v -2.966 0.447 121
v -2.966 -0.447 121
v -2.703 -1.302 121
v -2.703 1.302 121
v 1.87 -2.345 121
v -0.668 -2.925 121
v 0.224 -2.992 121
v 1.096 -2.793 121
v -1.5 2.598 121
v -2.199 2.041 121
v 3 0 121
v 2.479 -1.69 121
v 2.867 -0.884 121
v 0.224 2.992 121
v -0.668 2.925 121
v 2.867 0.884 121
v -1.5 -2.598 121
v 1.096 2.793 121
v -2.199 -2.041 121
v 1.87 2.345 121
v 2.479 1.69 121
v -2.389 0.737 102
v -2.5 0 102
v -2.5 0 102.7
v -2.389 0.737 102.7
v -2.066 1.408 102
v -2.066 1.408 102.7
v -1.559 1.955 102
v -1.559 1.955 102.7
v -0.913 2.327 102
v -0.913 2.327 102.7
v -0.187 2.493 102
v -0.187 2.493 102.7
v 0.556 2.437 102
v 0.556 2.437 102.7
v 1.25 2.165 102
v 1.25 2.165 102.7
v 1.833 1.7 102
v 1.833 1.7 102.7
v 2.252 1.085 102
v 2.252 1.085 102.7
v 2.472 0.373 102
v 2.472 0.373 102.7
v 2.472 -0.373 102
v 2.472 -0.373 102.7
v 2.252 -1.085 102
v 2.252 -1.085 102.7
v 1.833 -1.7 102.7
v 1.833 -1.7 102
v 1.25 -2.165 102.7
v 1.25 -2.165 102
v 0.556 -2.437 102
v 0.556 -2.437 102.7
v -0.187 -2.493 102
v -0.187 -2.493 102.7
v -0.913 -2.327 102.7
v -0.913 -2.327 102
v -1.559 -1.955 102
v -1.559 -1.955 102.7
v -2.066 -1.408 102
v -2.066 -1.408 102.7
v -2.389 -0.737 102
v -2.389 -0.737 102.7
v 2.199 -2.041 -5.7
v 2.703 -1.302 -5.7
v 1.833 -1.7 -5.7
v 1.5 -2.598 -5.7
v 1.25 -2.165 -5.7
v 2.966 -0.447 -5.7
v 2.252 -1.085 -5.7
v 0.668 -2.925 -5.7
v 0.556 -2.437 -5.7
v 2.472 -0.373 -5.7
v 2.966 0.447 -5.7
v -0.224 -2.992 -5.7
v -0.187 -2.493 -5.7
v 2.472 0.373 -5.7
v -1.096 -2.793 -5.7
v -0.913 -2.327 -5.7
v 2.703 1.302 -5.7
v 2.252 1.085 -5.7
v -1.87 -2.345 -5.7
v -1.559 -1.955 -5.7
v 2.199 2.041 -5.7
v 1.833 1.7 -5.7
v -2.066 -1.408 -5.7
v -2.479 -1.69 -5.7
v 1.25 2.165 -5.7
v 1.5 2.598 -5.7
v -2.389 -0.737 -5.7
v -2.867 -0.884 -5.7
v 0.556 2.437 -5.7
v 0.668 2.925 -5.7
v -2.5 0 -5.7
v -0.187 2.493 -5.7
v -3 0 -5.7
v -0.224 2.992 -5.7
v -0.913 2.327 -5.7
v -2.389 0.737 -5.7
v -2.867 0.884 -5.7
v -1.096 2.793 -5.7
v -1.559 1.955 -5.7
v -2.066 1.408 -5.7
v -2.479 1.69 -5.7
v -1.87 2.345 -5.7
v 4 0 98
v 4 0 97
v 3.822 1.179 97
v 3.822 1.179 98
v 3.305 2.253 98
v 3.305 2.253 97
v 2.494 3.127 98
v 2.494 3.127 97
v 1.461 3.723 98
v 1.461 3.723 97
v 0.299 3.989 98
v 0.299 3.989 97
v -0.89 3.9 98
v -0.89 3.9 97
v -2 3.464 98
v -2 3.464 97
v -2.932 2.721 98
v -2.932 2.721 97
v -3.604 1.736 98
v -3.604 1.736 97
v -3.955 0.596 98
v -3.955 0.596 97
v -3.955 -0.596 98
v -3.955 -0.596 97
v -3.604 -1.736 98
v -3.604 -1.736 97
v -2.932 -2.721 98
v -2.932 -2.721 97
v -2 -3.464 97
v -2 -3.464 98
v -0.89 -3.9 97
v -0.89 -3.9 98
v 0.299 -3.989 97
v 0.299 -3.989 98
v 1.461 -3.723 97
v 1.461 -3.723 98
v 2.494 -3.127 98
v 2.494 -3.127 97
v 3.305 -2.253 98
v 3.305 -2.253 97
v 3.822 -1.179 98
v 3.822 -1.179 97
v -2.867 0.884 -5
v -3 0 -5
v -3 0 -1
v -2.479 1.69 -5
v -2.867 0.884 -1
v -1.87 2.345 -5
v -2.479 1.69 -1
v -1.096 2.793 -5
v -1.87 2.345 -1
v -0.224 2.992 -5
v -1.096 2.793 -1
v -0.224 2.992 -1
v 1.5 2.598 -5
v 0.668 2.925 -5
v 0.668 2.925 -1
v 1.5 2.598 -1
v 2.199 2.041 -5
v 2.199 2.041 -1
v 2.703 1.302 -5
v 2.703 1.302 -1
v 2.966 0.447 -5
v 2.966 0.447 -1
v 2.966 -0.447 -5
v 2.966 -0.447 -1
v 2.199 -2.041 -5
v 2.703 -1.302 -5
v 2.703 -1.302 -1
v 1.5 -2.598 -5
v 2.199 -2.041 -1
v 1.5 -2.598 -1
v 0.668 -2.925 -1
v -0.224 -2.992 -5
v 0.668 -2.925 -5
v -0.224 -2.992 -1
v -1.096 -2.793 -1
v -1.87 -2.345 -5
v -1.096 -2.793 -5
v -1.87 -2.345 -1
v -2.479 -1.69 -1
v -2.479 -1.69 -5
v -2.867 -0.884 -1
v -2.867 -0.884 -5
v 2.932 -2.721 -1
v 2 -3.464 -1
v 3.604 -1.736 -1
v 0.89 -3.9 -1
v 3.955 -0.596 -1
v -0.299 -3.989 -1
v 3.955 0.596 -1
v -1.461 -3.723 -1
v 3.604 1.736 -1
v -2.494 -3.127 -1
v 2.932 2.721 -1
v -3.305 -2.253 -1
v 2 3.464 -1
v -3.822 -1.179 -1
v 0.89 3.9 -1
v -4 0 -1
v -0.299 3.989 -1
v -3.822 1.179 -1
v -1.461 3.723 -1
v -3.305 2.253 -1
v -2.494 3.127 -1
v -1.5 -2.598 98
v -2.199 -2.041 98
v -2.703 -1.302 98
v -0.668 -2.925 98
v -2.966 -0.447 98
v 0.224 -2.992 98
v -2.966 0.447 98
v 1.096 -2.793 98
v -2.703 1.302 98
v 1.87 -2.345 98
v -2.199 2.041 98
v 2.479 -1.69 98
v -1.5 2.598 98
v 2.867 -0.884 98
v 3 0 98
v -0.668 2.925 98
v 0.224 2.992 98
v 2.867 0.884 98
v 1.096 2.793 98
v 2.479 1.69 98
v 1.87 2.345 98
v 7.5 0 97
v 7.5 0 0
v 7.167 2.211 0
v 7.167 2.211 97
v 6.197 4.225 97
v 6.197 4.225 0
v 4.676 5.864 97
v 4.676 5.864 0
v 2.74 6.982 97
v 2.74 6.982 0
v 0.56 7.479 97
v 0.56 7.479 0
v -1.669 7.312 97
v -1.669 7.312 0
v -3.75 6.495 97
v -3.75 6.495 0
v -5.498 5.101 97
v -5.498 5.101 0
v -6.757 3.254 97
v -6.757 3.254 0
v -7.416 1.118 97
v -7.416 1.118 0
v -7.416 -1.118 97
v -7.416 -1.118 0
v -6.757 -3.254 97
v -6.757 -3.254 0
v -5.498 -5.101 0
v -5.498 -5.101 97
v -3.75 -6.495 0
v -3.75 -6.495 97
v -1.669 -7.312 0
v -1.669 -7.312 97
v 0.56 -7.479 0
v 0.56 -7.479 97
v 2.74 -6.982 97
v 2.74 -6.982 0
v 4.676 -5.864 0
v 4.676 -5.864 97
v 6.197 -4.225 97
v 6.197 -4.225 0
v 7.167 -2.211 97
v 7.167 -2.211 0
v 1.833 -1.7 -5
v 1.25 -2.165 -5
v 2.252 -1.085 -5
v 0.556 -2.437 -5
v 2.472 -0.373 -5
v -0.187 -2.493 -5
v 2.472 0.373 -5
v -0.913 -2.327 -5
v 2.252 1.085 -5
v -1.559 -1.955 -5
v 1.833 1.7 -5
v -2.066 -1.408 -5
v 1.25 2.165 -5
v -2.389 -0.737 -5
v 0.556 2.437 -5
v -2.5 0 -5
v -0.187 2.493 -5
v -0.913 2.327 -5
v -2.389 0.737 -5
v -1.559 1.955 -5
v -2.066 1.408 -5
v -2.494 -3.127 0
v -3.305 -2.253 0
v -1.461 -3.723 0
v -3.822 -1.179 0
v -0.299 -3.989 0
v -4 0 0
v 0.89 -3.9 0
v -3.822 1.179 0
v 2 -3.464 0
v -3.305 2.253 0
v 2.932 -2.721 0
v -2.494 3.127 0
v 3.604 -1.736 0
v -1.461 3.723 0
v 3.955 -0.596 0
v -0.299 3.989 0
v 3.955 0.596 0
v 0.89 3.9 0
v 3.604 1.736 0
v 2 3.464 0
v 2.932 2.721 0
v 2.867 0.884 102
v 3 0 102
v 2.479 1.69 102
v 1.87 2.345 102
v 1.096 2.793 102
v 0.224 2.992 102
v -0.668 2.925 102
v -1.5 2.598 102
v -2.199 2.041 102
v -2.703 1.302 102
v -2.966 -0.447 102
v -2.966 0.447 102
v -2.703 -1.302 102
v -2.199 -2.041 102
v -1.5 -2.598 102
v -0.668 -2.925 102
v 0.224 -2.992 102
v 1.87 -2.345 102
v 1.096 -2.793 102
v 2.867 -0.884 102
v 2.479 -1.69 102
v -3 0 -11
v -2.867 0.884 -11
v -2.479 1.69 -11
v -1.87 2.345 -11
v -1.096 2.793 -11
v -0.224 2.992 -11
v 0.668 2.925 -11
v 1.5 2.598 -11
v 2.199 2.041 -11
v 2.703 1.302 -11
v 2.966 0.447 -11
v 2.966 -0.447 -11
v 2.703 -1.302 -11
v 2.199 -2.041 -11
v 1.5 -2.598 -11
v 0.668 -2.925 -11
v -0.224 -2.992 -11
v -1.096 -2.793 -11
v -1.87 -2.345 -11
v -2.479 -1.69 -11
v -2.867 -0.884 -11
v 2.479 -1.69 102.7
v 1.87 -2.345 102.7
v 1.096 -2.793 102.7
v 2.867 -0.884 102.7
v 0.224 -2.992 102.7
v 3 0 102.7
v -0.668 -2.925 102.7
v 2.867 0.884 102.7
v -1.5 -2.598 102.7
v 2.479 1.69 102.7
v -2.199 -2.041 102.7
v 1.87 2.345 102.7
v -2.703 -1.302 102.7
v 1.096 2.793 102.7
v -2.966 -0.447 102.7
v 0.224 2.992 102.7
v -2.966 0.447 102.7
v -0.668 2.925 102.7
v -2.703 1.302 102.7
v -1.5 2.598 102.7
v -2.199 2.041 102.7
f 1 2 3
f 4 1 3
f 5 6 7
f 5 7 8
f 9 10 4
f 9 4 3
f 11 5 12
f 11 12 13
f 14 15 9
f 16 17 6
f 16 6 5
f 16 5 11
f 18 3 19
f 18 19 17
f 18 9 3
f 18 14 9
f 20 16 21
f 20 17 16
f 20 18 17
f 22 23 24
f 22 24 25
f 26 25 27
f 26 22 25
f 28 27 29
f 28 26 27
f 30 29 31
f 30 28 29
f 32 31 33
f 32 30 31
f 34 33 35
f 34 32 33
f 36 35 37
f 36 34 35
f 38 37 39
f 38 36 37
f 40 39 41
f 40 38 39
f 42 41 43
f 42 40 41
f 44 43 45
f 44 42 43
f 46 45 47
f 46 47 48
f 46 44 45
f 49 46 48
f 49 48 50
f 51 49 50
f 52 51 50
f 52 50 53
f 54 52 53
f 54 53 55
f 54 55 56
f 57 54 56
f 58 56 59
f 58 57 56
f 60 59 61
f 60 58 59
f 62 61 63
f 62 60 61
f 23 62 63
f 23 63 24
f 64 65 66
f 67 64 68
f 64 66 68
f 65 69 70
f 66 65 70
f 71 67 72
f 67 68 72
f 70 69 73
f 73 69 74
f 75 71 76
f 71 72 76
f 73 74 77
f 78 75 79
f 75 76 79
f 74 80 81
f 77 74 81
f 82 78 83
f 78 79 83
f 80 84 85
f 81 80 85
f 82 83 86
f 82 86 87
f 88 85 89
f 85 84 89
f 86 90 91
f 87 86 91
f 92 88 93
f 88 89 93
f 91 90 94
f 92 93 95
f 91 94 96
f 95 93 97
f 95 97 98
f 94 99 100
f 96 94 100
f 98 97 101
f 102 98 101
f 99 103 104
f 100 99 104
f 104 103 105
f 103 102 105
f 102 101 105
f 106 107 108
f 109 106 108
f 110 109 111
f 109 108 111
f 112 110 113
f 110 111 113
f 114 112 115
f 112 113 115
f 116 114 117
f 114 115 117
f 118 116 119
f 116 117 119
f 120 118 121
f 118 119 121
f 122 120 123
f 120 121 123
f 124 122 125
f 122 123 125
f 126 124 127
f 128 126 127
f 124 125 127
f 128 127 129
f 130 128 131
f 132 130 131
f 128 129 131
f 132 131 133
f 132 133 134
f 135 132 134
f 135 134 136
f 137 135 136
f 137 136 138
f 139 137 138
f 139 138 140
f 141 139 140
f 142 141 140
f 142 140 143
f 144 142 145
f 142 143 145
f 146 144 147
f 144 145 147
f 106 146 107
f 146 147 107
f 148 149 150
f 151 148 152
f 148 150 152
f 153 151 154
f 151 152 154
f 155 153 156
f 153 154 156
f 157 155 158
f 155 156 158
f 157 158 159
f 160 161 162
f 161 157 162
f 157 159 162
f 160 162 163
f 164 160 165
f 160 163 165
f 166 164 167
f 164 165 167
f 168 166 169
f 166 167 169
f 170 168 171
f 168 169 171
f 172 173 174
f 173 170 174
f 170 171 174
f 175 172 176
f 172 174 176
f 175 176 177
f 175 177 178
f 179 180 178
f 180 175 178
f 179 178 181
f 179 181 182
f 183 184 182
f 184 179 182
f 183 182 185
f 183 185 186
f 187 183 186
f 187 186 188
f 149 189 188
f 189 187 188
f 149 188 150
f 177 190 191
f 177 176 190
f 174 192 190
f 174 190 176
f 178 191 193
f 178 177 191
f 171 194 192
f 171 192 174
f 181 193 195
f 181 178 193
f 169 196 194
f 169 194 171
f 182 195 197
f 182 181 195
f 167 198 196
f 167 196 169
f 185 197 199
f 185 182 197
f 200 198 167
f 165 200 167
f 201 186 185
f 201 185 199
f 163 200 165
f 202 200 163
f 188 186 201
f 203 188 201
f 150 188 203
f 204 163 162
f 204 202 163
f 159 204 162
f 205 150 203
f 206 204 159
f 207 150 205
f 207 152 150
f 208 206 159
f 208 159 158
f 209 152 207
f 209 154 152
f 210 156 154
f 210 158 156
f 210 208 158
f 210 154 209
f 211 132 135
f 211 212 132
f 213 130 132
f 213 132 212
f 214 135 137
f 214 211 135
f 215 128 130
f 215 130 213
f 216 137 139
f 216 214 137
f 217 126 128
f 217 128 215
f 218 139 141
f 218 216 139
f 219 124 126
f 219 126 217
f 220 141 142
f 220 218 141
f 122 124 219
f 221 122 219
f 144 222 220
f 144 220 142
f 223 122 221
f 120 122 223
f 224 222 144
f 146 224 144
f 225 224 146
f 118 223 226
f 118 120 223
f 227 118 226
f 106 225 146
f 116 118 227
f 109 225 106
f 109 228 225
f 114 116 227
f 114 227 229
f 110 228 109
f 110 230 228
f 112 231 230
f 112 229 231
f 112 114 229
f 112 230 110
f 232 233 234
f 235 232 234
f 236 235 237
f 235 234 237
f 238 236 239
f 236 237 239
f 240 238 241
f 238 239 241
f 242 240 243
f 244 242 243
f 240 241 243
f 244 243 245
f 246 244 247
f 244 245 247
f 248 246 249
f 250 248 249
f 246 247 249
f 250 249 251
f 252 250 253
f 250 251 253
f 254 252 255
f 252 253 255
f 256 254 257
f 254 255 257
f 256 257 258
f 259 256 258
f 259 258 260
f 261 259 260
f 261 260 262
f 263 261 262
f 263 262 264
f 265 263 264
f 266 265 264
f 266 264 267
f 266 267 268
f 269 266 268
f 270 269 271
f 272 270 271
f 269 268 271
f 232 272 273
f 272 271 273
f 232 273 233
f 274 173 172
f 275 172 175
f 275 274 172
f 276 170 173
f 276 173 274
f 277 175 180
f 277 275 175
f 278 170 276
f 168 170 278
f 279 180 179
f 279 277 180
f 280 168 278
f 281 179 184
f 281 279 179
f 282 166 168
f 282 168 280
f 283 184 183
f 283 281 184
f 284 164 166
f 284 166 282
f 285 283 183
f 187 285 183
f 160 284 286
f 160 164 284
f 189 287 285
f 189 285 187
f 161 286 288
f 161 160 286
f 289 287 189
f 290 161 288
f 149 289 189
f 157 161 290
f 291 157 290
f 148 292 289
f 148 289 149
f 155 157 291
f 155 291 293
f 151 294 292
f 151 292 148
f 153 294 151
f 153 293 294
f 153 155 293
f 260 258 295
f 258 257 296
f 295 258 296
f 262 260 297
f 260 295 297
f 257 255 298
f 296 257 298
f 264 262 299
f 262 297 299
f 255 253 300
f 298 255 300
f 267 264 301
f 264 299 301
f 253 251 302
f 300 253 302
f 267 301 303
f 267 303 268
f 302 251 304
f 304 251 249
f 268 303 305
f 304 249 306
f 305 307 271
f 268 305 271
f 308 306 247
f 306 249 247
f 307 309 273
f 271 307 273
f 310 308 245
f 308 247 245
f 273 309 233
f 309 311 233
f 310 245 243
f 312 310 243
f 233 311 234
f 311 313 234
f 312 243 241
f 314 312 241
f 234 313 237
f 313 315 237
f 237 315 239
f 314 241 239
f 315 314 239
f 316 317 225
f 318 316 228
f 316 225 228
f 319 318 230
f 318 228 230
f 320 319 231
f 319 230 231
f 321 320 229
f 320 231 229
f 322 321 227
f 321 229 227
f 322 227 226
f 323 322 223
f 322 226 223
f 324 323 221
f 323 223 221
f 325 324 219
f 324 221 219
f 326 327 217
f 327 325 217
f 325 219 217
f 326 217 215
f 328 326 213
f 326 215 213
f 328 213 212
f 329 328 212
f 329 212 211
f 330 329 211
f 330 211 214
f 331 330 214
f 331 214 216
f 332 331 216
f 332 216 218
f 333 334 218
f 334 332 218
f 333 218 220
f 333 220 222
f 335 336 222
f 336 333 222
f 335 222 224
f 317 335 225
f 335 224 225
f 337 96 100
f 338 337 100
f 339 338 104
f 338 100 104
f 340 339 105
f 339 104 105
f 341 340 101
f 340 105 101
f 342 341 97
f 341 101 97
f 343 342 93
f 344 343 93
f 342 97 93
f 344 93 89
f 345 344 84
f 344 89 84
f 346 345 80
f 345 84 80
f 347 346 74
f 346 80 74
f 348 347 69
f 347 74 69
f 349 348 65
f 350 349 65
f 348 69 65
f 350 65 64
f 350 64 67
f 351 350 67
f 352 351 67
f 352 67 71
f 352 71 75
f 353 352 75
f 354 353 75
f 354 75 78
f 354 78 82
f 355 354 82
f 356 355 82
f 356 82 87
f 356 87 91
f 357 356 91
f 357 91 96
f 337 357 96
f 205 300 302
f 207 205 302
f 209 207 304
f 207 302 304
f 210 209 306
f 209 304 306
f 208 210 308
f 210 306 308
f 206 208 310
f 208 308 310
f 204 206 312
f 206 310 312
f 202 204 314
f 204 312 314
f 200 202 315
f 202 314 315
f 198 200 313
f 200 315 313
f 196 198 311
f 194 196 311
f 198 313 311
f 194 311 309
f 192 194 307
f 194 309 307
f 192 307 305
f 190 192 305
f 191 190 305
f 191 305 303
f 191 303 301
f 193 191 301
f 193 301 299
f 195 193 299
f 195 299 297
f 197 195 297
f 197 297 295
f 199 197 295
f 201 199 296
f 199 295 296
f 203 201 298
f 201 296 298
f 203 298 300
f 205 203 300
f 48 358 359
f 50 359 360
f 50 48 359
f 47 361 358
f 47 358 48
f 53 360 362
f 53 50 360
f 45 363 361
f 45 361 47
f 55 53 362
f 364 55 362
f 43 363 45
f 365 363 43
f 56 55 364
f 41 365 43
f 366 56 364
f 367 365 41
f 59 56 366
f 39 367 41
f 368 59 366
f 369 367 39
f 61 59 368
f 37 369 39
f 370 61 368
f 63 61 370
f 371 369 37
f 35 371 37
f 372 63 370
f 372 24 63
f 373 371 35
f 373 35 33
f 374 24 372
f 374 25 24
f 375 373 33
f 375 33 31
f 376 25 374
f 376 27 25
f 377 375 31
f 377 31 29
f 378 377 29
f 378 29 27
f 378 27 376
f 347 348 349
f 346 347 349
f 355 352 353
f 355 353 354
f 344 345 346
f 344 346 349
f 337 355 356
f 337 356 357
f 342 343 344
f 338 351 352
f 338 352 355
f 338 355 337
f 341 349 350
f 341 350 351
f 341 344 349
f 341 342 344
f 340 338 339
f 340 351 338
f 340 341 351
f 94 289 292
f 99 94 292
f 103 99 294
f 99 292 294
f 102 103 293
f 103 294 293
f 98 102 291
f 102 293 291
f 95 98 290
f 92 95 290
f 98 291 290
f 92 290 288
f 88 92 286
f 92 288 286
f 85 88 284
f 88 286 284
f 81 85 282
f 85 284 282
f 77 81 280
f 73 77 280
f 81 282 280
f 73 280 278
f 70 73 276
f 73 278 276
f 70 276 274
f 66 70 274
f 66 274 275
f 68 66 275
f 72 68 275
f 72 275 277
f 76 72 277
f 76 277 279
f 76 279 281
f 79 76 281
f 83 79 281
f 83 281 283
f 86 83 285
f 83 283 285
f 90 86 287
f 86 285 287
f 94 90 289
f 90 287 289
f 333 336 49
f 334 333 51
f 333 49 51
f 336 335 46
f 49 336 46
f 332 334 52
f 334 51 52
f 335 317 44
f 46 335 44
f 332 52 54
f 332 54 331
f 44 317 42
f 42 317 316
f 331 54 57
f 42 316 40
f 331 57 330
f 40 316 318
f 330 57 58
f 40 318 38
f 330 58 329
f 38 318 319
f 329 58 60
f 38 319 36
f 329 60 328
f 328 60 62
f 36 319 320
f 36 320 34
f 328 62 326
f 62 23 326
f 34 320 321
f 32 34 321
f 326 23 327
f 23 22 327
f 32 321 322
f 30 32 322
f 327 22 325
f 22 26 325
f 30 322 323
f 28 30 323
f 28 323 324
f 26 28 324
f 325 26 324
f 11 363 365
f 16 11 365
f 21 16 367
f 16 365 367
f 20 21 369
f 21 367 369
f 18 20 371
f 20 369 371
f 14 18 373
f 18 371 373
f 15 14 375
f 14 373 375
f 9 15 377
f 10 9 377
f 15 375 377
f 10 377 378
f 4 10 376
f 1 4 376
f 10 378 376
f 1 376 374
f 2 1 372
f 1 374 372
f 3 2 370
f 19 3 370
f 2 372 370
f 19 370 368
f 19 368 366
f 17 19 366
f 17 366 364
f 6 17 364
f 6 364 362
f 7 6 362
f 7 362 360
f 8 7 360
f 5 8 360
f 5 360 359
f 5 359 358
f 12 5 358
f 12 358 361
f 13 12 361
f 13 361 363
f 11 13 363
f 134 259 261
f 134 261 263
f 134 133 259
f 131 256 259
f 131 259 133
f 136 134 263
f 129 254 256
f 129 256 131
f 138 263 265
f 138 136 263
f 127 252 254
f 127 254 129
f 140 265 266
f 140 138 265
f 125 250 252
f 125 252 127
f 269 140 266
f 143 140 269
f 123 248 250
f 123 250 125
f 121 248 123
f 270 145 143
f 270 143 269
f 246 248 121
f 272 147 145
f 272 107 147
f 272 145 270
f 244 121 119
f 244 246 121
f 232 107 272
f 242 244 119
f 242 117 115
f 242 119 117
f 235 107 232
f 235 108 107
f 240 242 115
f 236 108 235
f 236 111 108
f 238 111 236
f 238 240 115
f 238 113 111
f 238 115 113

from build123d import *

# Parameters (mm, degrees)
SKETCH_1_R          = 7.5
EXTRUDE_1_DEPTH     = 97
SKETCH_2_R          = 4
EXTRUDE_2_DEPTH     = 1
SKETCH_3_R          = 3
EXTRUDE_3_DEPTH     = 10
SKETCH_4_R          = 4
EXTRUDE_4_DEPTH     = 1
SKETCH_5_R          = 3
EXTRUDE_5_DEPTH     = 23
SKETCH_6_R          = 6.147127497
SKETCH_6_R_2        = 2.5
CUT_EXTRUDE_1_DEPTH = 0.7
SKETCH_7_R          = 6.101942299
SKETCH_7_R_2        = 2.5
CUT_EXTRUDE_2_DEPTH = 0.7


with BuildPart() as part:
    # 草图1 → 凸台-拉伸1 (new body)
    with BuildSketch(Plane.XY):
        Circle(SKETCH_1_R)
    extrude(amount=EXTRUDE_1_DEPTH)

    # 草图2 → 凸台-拉伸2 (add)
    with BuildSketch(Plane(origin=(0, 0, 0), x_dir=(-1, 0, 0), z_dir=(0, 0, -1))):
        Circle(SKETCH_2_R)
    extrude(amount=EXTRUDE_2_DEPTH)

    # 草图3 → 凸台-拉伸3 (add)
    with BuildSketch(Plane(origin=(0, 0, -1), x_dir=(-1, 0, 0), z_dir=(0, 0, -1))):
        Circle(SKETCH_3_R)
    extrude(amount=EXTRUDE_3_DEPTH)

    # 草图4 → 凸台-拉伸4 (add)
    with BuildSketch(Plane.XY.offset(97)):
        Circle(SKETCH_4_R)
    extrude(amount=EXTRUDE_4_DEPTH)

    # 草图5 → 凸台-拉伸5 (add)
    with BuildSketch(Plane.XY.offset(98)):
        Circle(SKETCH_5_R)
    extrude(amount=EXTRUDE_5_DEPTH)

    # 草图6 → 切除-拉伸1 (cut)
    with BuildSketch(Plane(origin=(0, 0, -5), x_dir=(-1, 0, 0), z_dir=(0, 0, -1))):
        Circle(SKETCH_6_R)
        Circle(SKETCH_6_R_2, mode=Mode.SUBTRACT)
    extrude(amount=CUT_EXTRUDE_1_DEPTH, mode=Mode.SUBTRACT)

    # 草图7 → 切除-拉伸2 (cut)
    with BuildSketch(Plane(origin=(0, 0, 102), x_dir=(-1, 0, 0), z_dir=(0, 0, -1))):
        Circle(SKETCH_7_R)
        Circle(SKETCH_7_R_2, mode=Mode.SUBTRACT)
    extrude(amount=-CUT_EXTRUDE_2_DEPTH, mode=Mode.SUBTRACT)


solid = part.part
